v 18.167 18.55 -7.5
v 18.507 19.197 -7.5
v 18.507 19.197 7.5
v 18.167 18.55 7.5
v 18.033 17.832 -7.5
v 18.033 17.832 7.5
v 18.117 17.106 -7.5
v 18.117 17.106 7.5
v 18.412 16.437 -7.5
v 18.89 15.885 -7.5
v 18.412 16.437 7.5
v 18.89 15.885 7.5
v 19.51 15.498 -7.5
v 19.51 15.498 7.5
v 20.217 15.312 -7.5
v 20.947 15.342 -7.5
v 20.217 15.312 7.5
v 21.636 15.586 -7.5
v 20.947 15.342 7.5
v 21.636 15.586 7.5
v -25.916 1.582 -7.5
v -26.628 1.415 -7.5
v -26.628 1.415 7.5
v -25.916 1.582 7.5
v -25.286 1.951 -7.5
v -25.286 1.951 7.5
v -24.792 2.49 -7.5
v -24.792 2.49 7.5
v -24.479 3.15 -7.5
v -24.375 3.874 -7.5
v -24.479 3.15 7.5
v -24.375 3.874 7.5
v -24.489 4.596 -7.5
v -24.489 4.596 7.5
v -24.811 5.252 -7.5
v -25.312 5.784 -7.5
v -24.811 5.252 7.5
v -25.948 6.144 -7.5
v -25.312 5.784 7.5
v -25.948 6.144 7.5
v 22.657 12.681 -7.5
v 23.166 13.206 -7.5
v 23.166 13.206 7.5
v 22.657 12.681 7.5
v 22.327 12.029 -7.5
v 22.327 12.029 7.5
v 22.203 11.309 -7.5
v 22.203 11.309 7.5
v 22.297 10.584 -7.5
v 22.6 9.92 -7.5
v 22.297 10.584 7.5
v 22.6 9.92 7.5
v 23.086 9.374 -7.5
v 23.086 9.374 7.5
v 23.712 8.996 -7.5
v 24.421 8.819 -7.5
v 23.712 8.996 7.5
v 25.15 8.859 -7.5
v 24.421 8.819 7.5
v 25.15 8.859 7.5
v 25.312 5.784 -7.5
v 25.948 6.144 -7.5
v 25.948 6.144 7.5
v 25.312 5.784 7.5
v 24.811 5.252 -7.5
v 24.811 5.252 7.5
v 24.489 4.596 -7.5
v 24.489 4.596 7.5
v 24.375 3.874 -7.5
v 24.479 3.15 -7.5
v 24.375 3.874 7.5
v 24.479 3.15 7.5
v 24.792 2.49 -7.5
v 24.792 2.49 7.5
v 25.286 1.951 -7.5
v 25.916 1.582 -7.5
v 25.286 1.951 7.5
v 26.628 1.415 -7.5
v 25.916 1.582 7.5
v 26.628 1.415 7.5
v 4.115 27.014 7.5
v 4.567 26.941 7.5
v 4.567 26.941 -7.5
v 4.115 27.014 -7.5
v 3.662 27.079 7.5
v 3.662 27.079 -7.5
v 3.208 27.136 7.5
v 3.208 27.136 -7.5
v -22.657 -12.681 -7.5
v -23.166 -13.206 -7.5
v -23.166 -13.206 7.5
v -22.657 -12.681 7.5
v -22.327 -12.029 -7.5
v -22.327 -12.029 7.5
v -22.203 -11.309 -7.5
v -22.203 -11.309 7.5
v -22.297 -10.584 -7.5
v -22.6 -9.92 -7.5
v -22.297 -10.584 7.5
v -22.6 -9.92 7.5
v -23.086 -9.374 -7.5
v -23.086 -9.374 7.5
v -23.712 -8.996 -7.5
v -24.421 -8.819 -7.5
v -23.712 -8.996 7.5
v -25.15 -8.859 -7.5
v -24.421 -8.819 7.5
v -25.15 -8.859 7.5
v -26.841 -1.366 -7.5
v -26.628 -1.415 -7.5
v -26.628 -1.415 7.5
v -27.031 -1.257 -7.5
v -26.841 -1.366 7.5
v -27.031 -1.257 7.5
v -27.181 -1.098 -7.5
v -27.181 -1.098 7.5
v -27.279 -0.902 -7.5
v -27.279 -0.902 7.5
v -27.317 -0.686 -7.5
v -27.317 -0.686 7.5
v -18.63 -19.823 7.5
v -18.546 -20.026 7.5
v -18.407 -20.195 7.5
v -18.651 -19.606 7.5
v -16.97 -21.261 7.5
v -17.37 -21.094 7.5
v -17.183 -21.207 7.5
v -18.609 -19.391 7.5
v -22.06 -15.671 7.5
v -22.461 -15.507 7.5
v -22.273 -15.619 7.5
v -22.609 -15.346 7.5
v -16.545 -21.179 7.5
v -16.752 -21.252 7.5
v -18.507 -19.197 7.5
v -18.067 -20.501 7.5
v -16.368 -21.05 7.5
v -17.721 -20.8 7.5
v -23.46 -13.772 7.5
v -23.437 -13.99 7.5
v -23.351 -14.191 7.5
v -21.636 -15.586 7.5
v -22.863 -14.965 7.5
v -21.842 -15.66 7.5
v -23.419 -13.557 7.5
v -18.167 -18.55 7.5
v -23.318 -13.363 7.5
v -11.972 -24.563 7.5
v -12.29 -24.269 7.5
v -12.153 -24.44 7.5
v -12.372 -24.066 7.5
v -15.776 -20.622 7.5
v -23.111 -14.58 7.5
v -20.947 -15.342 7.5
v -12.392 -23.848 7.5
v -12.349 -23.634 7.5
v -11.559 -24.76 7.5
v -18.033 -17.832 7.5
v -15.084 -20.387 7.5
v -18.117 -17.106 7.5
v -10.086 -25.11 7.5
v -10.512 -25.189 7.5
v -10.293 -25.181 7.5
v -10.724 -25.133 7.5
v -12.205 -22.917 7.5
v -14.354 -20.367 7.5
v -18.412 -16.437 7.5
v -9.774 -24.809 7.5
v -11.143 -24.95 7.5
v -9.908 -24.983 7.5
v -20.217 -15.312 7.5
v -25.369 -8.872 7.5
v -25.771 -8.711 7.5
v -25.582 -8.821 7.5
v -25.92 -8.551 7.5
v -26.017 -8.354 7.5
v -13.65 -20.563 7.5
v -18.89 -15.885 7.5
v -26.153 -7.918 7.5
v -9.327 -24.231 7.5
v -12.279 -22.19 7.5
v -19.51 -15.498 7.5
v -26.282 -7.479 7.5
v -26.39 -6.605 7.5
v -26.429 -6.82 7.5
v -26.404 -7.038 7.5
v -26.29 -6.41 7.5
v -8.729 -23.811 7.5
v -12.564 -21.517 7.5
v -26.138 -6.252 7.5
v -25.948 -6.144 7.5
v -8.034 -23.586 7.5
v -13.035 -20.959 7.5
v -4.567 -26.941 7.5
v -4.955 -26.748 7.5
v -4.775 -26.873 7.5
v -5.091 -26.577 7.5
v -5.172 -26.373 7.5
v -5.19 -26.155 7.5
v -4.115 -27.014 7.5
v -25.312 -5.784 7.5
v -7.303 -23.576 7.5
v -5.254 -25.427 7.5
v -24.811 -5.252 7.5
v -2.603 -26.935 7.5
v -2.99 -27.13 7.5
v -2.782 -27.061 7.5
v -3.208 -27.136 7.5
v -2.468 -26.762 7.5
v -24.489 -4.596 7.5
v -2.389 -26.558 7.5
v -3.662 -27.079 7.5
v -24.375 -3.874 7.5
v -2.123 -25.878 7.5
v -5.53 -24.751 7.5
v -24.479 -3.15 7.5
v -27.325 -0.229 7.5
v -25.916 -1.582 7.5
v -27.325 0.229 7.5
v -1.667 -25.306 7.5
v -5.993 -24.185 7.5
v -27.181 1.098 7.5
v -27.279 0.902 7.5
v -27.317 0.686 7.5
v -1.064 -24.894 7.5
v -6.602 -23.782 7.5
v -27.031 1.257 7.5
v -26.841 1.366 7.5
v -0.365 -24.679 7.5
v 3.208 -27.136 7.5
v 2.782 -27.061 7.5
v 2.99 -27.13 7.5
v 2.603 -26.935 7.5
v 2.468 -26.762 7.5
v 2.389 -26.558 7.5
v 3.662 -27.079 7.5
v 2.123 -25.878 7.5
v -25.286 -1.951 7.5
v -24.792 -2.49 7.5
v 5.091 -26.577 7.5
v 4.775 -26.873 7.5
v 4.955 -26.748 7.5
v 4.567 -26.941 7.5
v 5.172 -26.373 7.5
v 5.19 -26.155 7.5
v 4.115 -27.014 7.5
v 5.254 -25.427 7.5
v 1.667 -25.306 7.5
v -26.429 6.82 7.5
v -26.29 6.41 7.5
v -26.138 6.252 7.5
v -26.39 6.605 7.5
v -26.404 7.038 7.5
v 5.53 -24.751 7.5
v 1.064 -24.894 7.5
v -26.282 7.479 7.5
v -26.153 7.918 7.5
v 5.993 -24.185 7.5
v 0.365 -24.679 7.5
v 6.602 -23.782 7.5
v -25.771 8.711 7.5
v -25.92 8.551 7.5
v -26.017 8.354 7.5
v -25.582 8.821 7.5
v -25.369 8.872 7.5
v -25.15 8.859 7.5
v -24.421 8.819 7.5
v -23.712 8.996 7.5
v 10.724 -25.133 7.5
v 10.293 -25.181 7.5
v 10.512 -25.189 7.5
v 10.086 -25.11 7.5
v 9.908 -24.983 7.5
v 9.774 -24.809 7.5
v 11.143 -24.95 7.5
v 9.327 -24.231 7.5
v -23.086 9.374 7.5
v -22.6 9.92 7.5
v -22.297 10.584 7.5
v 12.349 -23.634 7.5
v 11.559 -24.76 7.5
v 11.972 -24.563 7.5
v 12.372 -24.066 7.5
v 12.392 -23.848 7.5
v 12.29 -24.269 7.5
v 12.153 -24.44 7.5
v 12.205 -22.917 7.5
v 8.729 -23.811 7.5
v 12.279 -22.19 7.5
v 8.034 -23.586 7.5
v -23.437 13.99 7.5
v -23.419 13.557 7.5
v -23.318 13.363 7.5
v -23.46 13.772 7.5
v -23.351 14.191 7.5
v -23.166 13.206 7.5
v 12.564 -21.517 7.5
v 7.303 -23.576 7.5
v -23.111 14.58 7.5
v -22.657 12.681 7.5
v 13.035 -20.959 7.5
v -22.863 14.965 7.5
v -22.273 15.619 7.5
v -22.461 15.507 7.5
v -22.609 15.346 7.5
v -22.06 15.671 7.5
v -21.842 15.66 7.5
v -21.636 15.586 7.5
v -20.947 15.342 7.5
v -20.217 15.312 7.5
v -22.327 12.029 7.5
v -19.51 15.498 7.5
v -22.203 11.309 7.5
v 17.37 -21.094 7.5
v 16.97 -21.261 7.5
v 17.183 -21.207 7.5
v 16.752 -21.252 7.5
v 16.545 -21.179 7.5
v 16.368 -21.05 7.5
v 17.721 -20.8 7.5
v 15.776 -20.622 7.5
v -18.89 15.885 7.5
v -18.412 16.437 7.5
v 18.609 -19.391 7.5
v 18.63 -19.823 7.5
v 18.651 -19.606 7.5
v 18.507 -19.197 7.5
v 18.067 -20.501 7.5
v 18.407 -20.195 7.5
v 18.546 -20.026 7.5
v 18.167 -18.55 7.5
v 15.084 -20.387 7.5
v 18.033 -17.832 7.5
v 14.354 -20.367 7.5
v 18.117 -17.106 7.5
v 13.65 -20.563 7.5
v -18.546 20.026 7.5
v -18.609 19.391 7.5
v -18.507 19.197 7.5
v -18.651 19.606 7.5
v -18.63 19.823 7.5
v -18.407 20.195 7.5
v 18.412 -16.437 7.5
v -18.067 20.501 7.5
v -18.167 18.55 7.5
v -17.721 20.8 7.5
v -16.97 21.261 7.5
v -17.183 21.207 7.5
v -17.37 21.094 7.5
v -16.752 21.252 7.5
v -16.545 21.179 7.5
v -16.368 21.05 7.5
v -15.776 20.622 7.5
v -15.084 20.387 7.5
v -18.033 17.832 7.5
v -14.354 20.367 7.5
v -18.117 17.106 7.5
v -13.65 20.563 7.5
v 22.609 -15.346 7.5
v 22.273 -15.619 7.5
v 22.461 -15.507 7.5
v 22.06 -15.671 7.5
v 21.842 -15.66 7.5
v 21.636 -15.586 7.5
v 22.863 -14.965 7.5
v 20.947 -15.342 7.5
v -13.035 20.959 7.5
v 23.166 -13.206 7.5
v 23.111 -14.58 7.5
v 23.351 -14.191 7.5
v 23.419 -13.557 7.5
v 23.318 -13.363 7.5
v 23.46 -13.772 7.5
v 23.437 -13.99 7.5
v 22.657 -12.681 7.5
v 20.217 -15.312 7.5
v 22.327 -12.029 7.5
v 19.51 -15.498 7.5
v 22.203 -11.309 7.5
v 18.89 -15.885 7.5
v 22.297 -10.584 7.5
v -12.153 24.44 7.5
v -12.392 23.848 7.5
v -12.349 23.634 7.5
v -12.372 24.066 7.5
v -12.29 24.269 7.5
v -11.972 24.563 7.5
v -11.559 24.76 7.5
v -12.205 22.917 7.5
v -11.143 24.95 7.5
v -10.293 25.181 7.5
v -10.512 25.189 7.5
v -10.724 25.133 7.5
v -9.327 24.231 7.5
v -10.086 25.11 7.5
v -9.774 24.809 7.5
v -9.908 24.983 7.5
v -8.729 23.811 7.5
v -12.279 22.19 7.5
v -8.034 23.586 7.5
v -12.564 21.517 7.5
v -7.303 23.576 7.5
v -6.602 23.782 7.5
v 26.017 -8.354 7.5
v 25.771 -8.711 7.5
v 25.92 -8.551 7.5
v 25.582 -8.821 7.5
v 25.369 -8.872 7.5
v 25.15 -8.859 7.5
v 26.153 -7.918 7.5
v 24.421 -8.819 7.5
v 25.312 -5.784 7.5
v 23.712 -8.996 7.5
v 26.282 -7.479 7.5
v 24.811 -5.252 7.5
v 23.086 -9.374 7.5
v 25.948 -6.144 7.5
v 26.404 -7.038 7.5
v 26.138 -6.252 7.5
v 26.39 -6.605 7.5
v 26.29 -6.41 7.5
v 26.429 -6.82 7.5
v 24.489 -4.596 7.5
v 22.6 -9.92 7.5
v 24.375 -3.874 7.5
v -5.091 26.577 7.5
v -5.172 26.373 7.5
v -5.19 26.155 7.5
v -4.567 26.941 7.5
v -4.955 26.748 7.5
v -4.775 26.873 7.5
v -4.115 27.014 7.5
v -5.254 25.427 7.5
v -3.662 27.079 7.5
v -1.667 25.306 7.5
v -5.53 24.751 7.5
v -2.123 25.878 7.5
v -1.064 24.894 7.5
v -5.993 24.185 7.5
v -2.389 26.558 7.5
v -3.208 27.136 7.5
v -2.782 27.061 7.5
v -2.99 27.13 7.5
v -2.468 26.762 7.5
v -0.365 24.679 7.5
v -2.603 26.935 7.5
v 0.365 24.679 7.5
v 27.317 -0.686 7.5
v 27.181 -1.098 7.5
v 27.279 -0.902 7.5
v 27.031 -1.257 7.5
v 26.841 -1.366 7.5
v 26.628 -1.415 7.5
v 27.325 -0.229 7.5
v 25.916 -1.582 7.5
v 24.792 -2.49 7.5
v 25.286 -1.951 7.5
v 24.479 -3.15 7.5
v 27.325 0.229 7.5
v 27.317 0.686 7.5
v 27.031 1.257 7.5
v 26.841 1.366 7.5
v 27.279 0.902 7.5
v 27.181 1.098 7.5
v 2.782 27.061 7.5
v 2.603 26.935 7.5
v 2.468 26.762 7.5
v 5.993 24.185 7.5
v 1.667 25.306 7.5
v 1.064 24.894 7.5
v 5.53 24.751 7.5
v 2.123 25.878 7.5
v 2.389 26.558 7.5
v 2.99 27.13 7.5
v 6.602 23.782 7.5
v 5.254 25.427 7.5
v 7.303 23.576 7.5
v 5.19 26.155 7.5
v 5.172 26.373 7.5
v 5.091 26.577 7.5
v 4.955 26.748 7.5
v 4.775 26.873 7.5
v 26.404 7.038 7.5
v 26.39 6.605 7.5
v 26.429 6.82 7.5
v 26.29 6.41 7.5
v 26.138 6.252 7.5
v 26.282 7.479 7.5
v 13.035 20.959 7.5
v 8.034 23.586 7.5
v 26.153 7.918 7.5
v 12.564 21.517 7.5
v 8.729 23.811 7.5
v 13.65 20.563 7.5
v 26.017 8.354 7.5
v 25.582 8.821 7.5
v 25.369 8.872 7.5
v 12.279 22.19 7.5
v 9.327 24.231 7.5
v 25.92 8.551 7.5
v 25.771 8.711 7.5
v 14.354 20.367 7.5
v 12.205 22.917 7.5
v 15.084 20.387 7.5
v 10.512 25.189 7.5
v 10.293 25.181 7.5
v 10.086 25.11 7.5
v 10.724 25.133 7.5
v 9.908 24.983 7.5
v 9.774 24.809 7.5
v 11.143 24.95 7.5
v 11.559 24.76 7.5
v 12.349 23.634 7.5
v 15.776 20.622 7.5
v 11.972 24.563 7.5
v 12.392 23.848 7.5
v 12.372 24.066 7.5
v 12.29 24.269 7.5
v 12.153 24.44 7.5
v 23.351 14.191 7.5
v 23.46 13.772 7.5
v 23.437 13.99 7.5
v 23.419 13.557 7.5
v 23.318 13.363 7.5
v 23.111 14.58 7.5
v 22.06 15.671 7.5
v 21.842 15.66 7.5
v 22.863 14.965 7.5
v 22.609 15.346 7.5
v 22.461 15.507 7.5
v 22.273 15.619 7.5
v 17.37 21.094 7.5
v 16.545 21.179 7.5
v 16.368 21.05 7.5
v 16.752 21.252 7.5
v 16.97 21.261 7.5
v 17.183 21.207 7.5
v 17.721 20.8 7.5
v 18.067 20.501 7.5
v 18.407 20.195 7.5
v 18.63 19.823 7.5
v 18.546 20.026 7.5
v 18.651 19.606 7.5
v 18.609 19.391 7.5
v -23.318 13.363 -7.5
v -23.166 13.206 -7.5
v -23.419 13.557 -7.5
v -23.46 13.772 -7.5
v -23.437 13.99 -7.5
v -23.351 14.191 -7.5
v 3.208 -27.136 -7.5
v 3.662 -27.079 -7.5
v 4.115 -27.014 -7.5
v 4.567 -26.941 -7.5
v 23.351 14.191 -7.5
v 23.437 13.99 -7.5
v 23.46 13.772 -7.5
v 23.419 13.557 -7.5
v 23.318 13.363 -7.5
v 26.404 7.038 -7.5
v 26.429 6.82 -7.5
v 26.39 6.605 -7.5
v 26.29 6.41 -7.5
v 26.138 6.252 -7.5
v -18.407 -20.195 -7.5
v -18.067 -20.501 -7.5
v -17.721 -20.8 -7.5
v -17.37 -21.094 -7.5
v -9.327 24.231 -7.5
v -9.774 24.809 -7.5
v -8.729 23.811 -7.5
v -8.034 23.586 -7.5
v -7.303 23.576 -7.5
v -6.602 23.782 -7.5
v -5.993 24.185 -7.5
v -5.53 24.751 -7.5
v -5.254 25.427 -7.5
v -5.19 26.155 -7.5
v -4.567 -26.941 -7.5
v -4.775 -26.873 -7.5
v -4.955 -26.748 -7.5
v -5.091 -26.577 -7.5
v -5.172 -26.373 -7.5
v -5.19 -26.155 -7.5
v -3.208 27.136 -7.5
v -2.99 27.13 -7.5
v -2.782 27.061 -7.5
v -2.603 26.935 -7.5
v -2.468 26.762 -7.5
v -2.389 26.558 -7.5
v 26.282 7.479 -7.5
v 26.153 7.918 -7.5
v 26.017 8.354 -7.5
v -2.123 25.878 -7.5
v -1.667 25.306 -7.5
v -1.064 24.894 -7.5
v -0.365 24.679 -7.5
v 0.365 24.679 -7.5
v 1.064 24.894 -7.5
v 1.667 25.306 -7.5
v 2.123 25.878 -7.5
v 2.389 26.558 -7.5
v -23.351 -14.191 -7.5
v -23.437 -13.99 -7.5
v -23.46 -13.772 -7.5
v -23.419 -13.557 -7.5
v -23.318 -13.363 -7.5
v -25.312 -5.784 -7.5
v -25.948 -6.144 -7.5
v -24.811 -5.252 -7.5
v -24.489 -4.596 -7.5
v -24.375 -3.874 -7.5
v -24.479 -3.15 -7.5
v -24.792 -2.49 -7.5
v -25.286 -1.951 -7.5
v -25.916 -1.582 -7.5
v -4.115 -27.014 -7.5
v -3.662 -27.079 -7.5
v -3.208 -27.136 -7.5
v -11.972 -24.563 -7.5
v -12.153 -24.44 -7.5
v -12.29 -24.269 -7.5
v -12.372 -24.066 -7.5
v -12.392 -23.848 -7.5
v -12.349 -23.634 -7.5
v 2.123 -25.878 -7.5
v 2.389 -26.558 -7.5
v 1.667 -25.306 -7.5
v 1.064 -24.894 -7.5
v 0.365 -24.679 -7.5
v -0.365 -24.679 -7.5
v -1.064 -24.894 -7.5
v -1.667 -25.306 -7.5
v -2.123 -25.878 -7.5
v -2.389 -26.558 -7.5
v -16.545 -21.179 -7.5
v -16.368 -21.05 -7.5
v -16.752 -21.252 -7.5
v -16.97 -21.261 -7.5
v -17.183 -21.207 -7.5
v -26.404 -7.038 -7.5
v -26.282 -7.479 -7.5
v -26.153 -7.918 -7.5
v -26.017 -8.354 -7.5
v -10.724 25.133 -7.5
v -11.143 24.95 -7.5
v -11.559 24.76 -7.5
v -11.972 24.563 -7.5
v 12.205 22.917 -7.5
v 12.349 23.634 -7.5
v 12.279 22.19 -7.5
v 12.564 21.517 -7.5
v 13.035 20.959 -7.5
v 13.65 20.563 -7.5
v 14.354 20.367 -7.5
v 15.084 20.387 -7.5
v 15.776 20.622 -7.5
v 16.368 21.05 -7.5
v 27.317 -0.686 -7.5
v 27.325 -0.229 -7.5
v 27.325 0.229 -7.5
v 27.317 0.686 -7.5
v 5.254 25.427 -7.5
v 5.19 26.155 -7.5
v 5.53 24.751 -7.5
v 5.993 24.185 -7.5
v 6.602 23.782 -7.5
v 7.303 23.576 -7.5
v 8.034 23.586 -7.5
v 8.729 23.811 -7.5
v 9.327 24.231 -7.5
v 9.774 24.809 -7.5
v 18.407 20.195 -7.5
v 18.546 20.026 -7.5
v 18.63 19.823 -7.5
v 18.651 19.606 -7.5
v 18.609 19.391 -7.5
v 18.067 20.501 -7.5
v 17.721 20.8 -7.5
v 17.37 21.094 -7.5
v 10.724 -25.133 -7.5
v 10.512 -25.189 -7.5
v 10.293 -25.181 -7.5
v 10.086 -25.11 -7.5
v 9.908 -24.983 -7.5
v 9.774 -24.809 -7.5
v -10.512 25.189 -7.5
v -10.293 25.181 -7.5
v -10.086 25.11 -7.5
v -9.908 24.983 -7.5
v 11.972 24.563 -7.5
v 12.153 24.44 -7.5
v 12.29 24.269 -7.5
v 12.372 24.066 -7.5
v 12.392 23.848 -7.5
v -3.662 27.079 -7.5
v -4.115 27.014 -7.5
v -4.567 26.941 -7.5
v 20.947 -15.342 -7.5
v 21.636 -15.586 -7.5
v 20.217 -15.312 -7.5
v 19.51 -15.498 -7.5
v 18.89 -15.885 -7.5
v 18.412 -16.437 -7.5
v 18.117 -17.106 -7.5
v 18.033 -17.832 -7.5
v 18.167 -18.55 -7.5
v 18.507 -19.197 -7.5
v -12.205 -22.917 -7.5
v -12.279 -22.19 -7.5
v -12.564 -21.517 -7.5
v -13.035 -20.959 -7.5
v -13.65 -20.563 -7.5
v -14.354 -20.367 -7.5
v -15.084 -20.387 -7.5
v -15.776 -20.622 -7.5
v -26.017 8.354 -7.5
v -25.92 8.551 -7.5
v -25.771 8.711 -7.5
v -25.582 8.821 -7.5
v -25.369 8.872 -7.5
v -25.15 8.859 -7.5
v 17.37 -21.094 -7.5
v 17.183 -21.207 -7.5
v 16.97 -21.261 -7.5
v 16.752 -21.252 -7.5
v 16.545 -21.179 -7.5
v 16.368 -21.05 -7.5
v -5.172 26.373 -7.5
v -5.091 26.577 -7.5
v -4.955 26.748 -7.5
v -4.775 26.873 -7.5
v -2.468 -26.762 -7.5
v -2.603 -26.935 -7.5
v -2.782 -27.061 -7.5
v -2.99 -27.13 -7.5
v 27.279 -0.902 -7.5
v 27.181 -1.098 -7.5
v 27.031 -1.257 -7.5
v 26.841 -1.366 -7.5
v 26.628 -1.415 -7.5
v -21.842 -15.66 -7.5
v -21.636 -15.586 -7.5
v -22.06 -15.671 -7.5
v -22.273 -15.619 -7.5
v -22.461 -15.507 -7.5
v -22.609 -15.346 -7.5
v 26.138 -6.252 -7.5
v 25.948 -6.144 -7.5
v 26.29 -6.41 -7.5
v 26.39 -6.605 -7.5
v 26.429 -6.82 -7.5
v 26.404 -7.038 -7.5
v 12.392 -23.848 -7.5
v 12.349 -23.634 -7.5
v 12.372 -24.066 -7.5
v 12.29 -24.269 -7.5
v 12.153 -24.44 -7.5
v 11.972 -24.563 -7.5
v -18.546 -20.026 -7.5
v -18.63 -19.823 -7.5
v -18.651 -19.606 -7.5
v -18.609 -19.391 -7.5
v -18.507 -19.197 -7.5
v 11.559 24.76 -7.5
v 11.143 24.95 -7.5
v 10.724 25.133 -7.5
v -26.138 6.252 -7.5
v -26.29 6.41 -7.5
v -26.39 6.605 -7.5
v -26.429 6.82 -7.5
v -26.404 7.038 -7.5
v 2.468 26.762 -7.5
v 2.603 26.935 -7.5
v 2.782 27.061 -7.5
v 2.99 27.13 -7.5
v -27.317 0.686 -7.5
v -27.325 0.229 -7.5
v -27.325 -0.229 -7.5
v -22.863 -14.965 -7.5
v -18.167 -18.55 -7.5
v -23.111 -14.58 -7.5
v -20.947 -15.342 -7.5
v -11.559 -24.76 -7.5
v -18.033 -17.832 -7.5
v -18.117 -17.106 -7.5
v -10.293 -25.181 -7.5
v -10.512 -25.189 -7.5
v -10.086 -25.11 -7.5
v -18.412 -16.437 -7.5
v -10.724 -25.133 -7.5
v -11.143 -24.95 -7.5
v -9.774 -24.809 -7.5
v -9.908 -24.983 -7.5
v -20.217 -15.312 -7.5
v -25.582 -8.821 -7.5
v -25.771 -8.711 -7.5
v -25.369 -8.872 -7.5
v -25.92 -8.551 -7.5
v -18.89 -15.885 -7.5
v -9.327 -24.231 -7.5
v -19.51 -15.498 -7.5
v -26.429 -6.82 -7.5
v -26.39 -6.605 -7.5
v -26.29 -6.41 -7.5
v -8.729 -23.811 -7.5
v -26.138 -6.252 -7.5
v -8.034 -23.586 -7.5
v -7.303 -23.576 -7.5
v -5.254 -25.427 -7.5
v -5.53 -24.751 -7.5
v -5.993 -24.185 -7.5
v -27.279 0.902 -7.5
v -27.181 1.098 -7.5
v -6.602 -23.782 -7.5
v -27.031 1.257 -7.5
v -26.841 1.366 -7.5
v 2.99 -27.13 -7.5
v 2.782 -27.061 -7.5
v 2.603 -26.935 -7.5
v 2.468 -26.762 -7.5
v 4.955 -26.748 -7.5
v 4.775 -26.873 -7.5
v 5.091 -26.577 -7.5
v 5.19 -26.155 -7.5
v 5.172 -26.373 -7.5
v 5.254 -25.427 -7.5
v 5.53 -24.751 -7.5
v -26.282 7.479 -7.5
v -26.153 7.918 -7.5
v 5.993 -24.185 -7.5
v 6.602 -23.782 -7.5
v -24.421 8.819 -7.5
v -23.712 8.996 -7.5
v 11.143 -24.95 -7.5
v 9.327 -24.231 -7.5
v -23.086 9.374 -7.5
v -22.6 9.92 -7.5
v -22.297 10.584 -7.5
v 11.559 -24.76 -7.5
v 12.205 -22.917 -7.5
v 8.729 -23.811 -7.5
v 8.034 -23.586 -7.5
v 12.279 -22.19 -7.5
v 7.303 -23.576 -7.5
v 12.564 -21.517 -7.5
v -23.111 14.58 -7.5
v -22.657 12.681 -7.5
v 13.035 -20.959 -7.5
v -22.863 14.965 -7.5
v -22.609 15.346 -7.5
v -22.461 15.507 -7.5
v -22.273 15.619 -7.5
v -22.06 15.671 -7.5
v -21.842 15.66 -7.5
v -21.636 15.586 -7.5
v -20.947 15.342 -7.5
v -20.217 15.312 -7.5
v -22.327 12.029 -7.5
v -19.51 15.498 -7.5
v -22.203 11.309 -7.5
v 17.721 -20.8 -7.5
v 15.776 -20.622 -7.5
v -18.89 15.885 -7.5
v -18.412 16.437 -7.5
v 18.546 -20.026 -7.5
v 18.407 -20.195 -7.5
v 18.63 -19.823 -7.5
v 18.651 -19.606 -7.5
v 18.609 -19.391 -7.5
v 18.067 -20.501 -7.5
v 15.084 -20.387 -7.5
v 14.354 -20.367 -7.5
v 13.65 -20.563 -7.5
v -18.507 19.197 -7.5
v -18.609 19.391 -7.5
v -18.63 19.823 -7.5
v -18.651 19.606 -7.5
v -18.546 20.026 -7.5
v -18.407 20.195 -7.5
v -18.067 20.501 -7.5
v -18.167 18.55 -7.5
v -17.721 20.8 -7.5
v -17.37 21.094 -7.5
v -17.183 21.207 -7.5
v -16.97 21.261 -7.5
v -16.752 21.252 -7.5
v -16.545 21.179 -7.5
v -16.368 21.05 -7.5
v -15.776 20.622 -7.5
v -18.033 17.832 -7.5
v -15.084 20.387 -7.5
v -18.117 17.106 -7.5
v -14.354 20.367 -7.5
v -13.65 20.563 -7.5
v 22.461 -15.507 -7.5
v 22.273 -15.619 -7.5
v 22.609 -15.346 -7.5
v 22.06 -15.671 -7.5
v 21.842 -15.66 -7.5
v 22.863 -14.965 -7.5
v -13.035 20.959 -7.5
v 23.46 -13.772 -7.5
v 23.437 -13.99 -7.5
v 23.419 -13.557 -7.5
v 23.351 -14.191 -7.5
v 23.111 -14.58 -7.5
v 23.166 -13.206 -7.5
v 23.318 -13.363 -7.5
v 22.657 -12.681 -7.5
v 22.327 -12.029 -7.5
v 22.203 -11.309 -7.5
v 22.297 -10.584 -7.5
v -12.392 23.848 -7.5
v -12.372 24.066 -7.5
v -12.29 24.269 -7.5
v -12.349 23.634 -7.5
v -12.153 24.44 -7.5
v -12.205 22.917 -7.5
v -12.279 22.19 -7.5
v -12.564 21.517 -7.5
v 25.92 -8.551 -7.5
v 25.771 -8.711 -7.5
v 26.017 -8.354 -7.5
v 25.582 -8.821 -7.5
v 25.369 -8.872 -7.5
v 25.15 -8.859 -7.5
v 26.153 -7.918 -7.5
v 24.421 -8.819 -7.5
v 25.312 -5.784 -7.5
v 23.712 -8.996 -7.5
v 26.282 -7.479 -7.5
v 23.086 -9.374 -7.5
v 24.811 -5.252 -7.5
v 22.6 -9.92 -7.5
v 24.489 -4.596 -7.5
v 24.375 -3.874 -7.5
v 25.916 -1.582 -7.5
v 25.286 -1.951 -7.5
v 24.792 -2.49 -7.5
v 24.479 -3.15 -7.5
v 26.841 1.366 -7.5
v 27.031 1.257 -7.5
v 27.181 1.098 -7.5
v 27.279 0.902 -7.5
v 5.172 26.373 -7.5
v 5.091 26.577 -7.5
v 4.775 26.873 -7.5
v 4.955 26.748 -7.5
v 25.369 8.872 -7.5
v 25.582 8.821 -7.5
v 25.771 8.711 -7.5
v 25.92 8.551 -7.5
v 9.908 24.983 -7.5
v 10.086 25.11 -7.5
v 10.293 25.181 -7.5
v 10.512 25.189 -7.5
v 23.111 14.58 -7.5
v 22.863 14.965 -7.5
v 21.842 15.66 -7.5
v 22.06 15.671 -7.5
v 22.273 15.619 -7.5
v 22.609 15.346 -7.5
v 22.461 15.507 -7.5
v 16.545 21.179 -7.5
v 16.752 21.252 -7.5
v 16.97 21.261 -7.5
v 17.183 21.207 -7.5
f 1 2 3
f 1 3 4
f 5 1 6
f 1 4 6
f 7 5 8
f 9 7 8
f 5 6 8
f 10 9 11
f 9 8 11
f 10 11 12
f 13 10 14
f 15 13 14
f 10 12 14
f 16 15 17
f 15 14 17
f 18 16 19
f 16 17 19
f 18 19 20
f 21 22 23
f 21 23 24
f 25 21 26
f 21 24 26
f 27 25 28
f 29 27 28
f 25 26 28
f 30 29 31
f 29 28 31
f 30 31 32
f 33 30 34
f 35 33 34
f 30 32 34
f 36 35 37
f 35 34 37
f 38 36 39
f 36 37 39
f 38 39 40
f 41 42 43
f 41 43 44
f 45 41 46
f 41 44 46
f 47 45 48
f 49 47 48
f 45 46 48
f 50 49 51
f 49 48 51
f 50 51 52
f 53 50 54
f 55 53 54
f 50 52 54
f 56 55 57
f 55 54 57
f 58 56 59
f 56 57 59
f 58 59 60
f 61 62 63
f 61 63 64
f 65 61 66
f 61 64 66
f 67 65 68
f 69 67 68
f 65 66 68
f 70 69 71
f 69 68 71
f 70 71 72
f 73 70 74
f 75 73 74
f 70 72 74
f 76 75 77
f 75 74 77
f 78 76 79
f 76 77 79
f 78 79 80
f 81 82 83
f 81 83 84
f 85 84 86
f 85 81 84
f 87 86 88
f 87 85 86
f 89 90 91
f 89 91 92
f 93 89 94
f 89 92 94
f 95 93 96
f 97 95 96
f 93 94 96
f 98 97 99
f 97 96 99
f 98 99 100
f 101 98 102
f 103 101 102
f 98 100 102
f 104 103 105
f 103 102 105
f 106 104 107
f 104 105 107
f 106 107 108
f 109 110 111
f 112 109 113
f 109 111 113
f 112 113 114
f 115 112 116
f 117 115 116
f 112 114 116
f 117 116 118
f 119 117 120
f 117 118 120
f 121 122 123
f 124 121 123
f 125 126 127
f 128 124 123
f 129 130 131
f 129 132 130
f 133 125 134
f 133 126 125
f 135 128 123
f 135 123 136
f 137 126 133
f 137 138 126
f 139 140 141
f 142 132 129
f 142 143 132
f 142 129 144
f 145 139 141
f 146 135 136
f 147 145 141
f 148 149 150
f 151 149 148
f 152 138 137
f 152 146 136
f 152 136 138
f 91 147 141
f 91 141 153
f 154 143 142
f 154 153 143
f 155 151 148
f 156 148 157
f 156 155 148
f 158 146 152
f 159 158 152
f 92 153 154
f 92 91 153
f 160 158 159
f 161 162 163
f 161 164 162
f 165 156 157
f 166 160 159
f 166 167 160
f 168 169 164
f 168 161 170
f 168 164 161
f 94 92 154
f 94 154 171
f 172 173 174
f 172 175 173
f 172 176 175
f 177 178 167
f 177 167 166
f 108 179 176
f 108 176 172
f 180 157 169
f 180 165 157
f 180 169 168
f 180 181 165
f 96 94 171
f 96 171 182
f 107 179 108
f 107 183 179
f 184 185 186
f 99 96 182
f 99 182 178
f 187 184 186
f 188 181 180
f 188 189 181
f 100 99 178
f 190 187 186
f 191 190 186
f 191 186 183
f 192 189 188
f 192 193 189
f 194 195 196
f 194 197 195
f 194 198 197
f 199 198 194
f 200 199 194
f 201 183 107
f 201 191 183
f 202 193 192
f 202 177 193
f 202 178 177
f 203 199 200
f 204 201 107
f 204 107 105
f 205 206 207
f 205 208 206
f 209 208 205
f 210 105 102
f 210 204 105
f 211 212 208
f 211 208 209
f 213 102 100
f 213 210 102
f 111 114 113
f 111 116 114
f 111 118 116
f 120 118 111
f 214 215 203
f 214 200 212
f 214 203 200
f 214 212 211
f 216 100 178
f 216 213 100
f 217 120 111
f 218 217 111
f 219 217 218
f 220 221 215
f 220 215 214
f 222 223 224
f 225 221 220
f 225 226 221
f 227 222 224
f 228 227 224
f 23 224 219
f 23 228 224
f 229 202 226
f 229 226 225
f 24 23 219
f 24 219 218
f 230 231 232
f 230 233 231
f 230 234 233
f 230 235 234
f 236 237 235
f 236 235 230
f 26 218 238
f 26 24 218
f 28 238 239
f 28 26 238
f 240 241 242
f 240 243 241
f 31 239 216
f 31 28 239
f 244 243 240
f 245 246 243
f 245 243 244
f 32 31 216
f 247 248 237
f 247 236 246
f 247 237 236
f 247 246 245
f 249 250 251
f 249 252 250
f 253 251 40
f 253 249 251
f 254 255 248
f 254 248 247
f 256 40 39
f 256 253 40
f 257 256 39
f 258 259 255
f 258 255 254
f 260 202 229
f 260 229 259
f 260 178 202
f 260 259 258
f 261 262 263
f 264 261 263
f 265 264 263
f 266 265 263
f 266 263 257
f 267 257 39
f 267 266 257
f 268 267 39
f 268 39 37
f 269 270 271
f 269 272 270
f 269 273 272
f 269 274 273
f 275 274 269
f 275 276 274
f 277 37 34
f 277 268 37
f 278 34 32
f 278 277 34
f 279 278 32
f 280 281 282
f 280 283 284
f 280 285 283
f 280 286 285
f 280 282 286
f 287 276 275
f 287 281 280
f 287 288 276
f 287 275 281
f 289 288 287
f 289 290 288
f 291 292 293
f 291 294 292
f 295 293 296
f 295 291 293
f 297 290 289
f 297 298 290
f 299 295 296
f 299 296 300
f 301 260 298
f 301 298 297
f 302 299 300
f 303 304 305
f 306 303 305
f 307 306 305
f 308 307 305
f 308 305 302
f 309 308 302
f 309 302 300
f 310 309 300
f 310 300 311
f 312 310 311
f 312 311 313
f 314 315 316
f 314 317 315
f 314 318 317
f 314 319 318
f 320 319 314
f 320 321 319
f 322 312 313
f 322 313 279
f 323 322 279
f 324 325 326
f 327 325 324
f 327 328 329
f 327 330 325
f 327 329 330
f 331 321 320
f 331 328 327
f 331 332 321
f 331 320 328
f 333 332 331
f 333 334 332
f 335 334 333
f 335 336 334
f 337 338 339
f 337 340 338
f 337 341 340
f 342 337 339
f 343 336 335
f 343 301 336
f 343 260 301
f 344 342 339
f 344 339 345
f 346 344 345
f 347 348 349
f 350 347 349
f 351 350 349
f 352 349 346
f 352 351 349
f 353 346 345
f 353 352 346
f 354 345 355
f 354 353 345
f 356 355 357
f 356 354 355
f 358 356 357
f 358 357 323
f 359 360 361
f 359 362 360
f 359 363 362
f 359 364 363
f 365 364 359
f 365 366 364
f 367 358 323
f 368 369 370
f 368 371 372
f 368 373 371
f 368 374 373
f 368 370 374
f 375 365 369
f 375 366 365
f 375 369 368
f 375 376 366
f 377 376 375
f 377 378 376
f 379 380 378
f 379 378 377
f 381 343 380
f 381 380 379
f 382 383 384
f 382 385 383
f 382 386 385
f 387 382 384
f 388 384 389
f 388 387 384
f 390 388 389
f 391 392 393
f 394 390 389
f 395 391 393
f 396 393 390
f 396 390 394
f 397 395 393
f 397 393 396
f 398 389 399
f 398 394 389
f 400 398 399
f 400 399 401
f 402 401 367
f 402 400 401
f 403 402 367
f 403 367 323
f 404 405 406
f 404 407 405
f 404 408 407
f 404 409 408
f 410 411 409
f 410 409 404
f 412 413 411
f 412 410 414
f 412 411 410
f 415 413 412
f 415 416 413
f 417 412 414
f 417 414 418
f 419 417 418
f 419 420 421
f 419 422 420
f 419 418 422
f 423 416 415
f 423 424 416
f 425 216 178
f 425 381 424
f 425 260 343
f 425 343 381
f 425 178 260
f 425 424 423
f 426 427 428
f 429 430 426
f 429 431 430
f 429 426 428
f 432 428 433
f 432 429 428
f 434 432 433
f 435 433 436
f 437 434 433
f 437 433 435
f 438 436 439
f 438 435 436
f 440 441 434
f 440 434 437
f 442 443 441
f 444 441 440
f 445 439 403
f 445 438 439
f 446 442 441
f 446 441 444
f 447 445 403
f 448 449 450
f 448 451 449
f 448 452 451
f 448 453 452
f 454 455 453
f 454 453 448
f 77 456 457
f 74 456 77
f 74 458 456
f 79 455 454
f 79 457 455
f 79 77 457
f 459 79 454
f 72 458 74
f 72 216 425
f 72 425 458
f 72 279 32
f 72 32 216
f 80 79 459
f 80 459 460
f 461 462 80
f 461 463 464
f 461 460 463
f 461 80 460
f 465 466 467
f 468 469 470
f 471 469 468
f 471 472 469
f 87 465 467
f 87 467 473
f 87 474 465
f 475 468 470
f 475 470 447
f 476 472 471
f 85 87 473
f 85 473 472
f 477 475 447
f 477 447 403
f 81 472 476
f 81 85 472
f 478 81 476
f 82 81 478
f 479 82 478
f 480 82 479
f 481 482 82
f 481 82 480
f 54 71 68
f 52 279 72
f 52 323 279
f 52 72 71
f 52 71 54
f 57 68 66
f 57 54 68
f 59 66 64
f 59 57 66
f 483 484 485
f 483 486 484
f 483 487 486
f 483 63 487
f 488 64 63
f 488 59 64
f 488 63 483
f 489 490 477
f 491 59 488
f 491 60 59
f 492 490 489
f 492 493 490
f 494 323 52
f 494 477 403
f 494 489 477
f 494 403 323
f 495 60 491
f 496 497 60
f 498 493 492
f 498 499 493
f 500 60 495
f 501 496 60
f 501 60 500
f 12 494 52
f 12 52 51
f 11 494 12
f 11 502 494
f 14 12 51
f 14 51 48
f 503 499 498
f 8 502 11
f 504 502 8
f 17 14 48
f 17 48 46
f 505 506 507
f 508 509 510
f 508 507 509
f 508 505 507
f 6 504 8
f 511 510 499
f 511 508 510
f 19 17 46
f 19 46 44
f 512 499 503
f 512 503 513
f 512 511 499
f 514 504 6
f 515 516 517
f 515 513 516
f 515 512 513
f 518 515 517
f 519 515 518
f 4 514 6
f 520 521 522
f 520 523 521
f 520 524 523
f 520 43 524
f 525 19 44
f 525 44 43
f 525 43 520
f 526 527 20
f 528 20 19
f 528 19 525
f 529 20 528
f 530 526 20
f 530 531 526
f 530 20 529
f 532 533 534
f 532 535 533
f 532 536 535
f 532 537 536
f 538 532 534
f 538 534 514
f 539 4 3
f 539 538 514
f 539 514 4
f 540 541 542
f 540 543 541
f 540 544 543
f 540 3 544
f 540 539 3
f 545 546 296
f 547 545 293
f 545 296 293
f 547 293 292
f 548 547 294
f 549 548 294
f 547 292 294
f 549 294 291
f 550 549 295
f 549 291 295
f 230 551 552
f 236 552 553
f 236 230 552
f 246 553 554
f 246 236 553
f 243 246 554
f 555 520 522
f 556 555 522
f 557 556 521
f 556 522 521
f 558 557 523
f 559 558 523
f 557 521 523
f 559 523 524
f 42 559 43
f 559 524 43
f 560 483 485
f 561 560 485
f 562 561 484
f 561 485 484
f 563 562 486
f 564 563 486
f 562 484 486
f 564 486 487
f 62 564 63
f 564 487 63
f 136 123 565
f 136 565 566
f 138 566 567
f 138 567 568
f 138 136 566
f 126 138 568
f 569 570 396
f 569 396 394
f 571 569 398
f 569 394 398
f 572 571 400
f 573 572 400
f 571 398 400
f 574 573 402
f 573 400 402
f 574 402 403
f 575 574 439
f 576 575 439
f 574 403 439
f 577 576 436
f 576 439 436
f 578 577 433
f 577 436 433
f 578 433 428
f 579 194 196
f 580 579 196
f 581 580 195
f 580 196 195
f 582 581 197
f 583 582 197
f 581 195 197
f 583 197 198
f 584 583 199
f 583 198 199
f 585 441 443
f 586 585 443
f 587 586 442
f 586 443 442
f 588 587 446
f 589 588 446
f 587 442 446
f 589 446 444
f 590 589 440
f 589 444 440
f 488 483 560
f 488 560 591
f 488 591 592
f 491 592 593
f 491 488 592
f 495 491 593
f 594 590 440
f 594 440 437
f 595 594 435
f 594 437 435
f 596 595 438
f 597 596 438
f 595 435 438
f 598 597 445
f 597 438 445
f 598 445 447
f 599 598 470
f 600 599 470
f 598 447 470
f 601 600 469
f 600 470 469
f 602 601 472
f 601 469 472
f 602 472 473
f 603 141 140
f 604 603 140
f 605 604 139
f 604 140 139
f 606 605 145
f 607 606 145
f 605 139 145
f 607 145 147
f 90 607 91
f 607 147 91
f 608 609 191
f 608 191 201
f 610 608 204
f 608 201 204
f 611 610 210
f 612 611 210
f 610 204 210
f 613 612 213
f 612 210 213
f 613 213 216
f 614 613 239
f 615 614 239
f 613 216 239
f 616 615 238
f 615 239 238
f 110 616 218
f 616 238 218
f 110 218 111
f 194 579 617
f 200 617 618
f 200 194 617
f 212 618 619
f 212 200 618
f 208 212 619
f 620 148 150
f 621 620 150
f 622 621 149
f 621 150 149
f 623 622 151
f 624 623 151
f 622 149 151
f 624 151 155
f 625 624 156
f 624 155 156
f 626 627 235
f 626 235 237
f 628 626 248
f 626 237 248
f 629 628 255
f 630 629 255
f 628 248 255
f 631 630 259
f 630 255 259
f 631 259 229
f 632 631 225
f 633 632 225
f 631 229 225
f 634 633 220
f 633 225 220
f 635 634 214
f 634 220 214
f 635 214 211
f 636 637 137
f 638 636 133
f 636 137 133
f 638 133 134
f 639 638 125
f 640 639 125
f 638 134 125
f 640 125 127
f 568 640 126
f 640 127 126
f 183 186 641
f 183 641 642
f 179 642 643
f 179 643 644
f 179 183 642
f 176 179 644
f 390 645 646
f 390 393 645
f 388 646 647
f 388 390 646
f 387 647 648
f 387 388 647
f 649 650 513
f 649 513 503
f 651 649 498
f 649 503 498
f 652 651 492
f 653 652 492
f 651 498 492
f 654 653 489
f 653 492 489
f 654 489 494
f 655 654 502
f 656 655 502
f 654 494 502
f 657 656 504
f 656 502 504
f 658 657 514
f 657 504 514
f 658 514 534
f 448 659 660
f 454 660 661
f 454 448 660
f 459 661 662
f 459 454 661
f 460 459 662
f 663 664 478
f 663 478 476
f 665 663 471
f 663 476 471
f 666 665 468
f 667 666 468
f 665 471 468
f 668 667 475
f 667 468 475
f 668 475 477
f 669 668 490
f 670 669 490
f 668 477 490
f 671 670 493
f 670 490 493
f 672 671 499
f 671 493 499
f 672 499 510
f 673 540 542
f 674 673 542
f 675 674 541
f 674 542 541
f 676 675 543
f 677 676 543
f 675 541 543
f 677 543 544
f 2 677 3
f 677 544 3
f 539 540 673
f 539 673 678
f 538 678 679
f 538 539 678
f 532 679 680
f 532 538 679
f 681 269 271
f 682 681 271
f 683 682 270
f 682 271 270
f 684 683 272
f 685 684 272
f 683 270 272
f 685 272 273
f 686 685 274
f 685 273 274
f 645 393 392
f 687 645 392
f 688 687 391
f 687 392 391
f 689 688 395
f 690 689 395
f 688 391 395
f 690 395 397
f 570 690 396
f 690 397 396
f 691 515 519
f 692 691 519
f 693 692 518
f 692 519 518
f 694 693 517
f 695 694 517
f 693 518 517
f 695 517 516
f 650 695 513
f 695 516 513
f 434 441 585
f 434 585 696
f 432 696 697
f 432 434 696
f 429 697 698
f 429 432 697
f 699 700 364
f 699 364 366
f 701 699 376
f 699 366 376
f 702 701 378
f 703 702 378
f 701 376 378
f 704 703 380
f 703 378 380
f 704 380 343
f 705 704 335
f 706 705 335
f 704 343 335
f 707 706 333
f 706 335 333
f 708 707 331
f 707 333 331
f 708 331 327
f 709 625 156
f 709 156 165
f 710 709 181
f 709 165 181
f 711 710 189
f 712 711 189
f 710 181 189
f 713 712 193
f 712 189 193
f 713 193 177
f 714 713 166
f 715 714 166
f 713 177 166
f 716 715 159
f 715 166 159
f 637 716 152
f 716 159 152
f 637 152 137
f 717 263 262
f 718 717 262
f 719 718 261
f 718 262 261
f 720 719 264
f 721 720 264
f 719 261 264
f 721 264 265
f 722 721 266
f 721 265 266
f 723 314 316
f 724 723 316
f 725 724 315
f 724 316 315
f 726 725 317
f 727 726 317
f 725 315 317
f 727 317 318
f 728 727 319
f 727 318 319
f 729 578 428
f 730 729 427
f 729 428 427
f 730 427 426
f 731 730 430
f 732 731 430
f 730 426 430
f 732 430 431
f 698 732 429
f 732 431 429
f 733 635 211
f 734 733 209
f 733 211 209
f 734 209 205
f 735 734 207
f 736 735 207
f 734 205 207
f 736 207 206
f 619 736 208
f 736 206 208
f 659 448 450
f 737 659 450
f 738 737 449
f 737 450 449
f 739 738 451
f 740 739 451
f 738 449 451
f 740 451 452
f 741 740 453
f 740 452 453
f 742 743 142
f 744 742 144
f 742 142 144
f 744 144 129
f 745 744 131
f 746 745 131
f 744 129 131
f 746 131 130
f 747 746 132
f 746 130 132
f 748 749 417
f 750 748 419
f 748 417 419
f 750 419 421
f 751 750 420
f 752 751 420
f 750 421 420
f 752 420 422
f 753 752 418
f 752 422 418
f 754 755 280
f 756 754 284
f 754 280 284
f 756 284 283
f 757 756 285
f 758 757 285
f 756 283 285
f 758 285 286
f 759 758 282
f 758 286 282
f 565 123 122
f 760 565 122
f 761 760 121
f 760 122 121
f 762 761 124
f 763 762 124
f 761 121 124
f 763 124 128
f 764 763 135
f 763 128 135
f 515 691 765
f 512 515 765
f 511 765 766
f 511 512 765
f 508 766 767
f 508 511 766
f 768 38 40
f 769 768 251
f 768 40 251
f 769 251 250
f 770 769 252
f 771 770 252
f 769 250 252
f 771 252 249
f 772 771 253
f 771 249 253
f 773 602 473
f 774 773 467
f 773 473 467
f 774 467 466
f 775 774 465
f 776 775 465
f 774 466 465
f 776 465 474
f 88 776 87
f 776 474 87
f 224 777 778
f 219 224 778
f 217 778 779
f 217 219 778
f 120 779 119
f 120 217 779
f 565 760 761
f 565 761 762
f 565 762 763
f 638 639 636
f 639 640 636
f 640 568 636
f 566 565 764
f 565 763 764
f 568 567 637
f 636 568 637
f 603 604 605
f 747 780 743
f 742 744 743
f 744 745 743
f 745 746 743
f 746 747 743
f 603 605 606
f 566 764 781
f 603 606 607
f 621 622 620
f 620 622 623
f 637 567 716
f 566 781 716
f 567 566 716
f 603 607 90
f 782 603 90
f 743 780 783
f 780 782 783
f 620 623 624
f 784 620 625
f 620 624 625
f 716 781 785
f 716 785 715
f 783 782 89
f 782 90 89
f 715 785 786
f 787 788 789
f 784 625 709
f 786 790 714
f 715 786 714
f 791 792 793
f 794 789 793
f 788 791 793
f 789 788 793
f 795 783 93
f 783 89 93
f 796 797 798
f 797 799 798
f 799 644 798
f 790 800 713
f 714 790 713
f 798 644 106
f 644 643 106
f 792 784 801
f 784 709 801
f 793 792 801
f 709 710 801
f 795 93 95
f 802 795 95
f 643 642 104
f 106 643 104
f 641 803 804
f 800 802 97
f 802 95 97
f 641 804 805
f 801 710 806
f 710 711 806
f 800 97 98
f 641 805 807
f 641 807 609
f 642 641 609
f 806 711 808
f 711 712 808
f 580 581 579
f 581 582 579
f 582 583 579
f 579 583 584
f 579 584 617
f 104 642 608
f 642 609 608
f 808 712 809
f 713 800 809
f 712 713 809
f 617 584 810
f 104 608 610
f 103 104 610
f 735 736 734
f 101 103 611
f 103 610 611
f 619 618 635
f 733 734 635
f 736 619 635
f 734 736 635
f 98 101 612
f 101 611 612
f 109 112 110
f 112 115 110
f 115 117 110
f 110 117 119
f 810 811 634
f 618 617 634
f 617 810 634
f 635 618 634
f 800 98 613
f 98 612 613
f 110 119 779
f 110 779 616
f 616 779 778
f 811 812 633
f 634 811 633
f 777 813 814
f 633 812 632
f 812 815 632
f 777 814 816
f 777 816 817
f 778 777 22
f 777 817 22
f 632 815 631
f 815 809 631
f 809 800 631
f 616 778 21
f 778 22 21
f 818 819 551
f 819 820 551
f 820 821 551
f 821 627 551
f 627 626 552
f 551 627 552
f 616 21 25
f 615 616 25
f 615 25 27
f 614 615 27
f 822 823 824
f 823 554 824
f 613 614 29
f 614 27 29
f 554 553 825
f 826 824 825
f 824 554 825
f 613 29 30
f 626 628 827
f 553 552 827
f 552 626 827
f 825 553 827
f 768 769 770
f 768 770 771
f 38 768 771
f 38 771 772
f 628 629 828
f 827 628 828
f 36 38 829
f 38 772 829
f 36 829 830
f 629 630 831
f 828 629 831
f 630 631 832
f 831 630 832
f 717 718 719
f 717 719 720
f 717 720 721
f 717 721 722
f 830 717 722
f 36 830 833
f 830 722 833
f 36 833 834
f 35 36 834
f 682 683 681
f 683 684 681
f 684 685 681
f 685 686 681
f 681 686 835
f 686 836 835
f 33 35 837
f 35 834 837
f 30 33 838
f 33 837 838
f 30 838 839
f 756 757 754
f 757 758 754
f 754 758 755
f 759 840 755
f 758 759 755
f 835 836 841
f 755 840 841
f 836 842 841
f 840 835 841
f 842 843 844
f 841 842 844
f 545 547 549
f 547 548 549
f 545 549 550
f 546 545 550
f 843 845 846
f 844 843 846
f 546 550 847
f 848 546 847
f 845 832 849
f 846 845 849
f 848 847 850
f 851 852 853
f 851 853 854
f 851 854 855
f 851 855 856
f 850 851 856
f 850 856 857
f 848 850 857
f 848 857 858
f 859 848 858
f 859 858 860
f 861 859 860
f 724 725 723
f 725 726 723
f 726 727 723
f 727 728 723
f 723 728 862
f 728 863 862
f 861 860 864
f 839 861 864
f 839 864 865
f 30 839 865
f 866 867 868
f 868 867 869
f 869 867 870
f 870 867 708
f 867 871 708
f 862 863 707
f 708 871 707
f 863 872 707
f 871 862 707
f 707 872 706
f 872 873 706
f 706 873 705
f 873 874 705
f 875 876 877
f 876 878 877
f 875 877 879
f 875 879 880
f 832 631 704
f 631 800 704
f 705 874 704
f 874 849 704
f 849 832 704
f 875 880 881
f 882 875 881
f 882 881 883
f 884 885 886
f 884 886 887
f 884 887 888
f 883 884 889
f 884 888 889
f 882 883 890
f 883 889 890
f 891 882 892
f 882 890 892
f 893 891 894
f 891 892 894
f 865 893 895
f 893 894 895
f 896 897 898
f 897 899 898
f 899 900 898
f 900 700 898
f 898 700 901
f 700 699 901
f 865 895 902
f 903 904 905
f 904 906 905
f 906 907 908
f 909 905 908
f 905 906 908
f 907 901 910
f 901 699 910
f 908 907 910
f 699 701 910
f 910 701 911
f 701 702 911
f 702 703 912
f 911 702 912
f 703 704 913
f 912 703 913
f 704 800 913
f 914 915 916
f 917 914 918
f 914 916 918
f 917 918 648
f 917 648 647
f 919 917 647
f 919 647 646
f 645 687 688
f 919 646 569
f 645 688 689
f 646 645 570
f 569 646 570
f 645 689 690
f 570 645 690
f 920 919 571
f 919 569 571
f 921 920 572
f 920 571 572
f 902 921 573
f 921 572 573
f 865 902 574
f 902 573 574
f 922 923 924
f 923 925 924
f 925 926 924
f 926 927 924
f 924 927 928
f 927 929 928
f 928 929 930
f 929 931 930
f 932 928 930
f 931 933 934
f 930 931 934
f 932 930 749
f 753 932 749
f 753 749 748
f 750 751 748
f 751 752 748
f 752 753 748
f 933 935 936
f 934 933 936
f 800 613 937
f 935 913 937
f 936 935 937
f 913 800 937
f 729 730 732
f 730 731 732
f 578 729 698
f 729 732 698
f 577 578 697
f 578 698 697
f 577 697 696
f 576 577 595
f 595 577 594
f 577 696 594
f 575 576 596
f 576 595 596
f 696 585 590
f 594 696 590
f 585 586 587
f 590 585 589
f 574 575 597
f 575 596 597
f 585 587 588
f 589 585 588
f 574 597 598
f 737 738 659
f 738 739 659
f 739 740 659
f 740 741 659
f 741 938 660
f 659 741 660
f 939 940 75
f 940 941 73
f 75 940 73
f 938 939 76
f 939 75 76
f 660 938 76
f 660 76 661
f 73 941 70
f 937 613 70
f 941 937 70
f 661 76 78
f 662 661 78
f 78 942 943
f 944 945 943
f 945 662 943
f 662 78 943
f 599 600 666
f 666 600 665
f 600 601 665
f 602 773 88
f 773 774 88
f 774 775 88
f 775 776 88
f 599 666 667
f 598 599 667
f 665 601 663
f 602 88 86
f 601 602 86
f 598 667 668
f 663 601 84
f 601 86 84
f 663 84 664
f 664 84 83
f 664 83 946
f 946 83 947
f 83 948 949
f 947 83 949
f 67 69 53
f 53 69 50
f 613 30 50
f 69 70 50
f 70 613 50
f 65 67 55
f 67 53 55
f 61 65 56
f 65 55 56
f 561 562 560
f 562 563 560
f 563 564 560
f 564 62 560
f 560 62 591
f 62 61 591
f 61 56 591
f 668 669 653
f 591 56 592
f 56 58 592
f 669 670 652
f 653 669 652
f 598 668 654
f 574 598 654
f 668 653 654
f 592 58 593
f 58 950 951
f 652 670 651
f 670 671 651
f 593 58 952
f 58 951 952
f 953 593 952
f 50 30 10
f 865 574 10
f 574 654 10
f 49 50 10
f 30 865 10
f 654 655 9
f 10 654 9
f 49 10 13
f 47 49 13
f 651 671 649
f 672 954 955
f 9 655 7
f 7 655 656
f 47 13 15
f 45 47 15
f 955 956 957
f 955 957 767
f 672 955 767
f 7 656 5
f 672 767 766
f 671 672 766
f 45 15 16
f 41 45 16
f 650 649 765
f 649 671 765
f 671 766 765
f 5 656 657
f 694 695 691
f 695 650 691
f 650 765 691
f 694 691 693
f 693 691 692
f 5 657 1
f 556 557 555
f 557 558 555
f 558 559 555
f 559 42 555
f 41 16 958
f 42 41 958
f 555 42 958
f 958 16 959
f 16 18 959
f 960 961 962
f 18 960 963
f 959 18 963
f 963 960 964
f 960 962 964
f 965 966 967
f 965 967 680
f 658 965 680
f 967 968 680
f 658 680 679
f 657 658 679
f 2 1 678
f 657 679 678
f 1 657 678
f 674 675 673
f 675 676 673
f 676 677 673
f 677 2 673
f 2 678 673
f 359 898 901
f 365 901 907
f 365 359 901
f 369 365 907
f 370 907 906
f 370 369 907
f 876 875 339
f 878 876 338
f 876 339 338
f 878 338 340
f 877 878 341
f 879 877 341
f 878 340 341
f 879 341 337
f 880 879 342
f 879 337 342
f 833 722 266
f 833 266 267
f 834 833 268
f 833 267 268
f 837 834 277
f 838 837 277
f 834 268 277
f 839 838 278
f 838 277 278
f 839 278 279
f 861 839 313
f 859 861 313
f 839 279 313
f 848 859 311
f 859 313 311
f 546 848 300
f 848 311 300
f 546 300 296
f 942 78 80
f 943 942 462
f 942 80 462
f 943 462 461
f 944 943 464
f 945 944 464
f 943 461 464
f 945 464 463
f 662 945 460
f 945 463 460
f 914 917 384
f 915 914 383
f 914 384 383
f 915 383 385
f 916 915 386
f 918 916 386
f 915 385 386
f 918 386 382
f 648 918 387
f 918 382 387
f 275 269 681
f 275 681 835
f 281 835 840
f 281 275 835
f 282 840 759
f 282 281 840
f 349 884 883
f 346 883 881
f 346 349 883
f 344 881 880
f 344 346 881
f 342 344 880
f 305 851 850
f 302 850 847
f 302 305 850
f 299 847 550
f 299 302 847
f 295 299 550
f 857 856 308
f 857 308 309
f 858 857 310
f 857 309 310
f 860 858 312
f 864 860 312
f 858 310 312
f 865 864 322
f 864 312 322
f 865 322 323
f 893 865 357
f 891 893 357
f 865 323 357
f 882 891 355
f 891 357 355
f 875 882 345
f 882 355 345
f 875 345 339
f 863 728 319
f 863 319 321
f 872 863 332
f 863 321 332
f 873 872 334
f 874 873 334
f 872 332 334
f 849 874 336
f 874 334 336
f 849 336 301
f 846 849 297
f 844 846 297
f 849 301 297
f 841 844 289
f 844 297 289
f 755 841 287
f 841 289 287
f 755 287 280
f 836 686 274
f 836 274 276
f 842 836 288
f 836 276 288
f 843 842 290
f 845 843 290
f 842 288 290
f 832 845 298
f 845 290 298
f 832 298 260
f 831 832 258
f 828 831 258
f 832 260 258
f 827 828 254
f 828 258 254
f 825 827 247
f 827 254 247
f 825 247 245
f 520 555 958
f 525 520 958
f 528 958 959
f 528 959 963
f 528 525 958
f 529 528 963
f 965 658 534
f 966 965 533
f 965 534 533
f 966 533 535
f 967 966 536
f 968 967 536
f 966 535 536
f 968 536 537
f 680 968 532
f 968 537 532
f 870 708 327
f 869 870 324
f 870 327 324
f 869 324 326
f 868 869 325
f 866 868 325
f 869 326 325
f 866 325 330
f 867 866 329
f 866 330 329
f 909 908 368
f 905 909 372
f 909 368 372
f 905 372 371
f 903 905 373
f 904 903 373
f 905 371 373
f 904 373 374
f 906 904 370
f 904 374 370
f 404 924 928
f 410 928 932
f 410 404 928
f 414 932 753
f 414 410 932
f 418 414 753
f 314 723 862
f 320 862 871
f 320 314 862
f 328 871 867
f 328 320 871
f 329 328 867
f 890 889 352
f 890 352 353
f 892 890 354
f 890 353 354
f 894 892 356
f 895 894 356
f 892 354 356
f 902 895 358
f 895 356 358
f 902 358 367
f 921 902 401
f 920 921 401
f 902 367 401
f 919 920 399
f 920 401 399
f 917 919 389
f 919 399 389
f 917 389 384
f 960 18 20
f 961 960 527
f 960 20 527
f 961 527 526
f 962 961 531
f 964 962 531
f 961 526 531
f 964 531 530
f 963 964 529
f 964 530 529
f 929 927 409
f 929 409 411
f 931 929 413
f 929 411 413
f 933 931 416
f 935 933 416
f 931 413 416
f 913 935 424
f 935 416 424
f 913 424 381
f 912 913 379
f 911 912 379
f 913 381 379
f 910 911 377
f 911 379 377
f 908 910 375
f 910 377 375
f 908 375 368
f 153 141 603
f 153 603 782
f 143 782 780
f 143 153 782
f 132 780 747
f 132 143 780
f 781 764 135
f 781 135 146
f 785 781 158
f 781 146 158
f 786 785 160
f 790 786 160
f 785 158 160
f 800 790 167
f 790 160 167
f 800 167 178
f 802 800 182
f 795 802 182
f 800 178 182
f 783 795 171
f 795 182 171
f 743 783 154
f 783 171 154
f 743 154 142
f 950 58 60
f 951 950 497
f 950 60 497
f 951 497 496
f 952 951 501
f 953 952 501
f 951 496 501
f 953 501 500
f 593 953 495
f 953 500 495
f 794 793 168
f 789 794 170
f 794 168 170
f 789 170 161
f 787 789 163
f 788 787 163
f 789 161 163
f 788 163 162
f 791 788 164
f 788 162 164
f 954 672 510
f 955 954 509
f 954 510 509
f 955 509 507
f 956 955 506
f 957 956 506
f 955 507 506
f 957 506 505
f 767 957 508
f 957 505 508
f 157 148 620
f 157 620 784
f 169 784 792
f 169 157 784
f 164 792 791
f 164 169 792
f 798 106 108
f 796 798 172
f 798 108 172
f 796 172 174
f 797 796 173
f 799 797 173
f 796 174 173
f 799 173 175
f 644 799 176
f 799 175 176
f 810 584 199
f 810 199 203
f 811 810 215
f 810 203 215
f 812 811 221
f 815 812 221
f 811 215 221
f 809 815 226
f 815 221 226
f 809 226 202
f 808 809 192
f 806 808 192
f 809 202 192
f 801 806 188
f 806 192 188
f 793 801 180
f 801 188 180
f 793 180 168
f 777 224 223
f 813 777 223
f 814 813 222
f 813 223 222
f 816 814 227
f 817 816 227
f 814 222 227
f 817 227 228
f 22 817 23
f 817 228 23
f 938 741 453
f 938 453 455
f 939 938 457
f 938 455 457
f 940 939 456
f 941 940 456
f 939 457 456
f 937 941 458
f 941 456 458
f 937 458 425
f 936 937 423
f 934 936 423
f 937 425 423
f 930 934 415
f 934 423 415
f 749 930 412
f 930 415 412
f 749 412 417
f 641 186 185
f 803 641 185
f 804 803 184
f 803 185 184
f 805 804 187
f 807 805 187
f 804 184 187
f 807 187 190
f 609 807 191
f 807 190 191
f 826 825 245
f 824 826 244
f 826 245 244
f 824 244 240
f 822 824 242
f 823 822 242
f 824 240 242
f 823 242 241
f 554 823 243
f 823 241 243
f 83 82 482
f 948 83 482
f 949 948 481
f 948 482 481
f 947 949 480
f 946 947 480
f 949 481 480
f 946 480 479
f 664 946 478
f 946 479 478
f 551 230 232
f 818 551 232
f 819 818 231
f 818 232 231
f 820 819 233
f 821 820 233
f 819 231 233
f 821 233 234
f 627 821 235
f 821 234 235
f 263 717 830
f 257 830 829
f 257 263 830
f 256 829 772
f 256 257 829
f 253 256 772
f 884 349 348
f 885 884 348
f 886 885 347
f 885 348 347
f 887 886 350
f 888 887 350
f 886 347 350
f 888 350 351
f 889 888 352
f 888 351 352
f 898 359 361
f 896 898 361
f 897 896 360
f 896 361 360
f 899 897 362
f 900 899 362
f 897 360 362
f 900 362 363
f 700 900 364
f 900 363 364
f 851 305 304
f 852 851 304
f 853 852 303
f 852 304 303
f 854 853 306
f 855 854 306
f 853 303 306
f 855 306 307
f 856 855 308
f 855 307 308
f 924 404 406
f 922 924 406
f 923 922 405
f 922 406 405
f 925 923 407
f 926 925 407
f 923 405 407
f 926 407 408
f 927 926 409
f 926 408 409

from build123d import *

# Parameters (mm, degrees)
SKETCH1_R           = 27.325470016
BOSS_EXTRUDE1_DEPTH = 7.5
CUT_EXTRUDE1_DEPTH  = 7.5
CIRPATTERN1_COUNT   = 22


with BuildPart() as part:
    # Sketch1 → Boss-Extrude1 (new, symmetric)
    with BuildSketch(Plane.XY):
        Circle(SKETCH1_R)
    extrude(amount=BOSS_EXTRUDE1_DEPTH, both=True)

    # Sketch1<3> → Cut-Extrude1 (cut, symmetric)
    with BuildSketch(Plane.XY):
        with BuildLine():
            ThreePointArc((2.389000136, 26.557966834), (2.687762275, 27.004338738), (3.208387057, 27.136461893))
            ThreePointArc((3.208387057, 27.136461893), (-2.8e-08, 27.325470016), (-3.208387112, 27.136461887))
            ThreePointArc((-3.208387112, 27.136461887), (-2.687762323, 27.004338772), (-2.38900015, 26.557966895))
            ThreePointArc((-2.38900015, 26.557966895), (-3.2e-08, 24.651270016), (2.389000136, 26.557966834))
        make_face()
    cut_extrude1 = extrude(amount=CUT_EXTRUDE1_DEPTH, both=True, mode=Mode.SUBTRACT)

    # CirPattern1: Cut-Extrude1 ×22 about axis
    cirpattern1_axis = Axis((0, 0, 7.5), (0, 0, 1))
    for i in range(1, CIRPATTERN1_COUNT):
        add(cut_extrude1.rotate(cirpattern1_axis, i * 360 / CIRPATTERN1_COUNT), mode=Mode.SUBTRACT)


solid = part.part
